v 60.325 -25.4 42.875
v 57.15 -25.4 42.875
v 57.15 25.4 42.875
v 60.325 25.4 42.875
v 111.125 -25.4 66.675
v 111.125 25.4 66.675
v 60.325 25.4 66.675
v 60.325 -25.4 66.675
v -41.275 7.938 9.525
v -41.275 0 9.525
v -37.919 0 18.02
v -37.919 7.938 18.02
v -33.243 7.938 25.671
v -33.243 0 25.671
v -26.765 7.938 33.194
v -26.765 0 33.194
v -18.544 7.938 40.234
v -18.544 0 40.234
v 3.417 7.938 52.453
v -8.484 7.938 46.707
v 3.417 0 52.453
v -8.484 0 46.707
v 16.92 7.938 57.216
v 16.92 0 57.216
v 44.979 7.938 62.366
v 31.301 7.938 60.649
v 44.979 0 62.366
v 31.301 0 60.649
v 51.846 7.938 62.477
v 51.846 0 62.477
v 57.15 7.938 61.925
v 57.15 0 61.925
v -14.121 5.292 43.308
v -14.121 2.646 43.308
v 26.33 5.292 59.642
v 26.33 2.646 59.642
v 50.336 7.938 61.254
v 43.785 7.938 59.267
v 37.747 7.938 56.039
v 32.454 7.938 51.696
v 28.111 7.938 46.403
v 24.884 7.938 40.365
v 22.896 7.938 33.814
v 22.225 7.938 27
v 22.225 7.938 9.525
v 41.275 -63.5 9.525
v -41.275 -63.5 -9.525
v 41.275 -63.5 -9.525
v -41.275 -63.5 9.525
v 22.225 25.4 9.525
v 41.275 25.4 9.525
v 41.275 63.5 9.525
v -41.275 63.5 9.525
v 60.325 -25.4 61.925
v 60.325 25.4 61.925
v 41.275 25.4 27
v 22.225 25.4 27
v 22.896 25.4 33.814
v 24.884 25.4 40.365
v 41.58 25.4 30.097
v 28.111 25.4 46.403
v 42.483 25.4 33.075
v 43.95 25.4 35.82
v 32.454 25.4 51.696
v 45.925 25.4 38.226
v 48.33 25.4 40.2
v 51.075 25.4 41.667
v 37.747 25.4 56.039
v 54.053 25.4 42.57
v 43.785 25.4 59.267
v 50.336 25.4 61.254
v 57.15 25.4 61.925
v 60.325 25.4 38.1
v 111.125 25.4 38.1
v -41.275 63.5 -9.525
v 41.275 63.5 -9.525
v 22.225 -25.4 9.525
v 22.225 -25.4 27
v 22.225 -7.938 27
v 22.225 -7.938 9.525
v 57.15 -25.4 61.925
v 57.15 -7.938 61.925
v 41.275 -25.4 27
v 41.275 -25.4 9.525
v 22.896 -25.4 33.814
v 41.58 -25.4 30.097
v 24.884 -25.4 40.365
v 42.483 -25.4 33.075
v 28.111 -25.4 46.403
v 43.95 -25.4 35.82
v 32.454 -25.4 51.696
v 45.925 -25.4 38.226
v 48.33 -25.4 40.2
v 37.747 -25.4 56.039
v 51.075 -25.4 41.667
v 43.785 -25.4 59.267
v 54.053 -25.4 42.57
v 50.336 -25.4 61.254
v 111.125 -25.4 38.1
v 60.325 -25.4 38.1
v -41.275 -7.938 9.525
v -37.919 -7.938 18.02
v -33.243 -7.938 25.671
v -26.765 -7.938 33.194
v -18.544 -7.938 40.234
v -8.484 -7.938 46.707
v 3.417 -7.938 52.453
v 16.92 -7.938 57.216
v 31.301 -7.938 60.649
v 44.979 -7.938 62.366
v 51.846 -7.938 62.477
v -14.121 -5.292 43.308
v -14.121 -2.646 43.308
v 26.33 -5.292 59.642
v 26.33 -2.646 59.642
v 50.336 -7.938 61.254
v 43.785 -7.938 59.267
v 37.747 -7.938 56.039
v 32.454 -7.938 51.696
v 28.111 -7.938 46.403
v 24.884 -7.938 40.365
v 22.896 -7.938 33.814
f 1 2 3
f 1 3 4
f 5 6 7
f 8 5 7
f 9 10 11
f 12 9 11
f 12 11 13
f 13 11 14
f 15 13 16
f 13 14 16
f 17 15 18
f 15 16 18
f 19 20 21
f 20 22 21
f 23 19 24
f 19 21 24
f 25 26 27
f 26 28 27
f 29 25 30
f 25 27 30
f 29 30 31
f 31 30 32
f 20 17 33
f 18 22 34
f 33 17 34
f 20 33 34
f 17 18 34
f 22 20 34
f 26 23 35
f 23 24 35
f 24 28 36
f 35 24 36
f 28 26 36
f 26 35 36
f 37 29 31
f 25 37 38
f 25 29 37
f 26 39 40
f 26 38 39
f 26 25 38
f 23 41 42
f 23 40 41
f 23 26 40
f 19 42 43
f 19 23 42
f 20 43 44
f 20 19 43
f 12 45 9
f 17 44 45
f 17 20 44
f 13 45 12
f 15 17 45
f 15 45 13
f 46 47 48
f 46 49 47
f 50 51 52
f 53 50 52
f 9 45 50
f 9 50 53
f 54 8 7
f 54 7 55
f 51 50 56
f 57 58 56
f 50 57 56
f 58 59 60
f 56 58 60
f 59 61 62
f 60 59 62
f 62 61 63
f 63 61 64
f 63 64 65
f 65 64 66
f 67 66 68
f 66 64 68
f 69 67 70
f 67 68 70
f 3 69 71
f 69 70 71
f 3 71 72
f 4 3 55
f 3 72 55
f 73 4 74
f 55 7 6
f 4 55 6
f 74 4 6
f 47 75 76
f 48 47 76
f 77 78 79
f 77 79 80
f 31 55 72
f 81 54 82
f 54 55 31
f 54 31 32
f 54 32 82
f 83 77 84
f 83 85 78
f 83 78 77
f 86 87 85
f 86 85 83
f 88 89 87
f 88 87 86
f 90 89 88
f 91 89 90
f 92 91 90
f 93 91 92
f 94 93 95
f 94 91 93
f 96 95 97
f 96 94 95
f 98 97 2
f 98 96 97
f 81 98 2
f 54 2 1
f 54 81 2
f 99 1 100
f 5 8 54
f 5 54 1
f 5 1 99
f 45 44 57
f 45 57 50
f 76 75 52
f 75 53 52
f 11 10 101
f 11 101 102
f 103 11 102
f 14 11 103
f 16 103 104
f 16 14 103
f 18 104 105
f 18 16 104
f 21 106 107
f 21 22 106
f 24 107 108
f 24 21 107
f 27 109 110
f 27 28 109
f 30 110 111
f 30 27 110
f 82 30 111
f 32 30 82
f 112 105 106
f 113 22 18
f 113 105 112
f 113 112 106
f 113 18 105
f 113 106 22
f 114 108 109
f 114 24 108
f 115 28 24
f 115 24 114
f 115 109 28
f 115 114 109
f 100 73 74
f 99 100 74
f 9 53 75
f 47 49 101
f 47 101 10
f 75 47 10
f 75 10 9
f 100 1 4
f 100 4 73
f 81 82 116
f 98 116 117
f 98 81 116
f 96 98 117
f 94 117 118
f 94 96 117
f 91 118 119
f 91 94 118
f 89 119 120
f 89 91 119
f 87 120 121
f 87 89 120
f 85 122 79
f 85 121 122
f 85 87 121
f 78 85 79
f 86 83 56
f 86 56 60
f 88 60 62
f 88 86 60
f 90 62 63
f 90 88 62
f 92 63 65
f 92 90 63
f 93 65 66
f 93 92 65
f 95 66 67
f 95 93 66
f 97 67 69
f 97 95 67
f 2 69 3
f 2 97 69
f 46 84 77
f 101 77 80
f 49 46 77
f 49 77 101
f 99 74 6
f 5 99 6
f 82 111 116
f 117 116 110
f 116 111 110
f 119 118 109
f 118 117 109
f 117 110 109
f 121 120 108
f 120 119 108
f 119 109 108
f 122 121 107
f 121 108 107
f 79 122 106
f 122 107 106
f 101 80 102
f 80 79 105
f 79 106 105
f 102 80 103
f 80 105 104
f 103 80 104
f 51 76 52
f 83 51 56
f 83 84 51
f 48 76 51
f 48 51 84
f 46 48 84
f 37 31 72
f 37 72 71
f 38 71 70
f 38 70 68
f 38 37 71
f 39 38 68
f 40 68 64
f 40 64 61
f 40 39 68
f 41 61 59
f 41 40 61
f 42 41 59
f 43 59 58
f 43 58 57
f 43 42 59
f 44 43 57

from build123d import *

# Parameters (mm, degrees)
F1_DEPTH = 63.5
F2_DEPTH = 25.4
F3_DEPTH = 7.9375


with BuildPart() as f1:
    # F0 (on Front) → F1 (new body, symmetric)
    with BuildSketch(Plane.XZ):
        Polygon((-41.275, -9.525), (41.275, -9.525), (41.275, 9.525), (22.225, 9.525), (-41.275, 9.525), align=None)
    extrude(amount=F1_DEPTH, both=True)

    # F0 (on Front) → F2 (join, symmetric)
    with BuildSketch(Plane.XZ):
        with BuildLine():
            Line((22.225, 9.525), (41.275, 9.525))
            Line((41.275, 9.525), (41.275, 27.0002))
            ThreePointArc((41.275, 27.0002), (45.92468, 38.22552), (57.15, 42.8752))
            Line((57.15, 42.8752), (60.325, 42.8752))
            Line((60.325, 42.8752), (60.325, 61.9252))
            Line((60.325, 61.9252), (57.15, 61.9252))
            ThreePointArc((57.15, 61.9252), (32.454296, 51.695904), (22.225, 27.0002))
            Line((22.225, 27.0002), (22.225, 9.525))
        make_face()
        Polygon((91.891411, 61.9252), (60.325, 61.9252), (60.325, 42.8752), (74.520705, 42.8752), (91.891411, 42.8752), align=None)
        Polygon((60.325, 66.675), (60.325, 61.9252), (91.891411, 61.9252), (91.891411, 42.8752), (74.520705, 42.8752), (60.325, 42.8752), (60.325, 38.1), (111.125, 38.1), (111.125, 66.675), align=None)
    extrude(amount=F2_DEPTH, both=True)

    # F0 (on Front) → F3 (join, symmetric)
    with BuildSketch(Plane.XZ):
        with BuildLine():
            add(Edge.make_bspline(
                [(-41.275, 9.525), (-28.410731, 53.163726), (38.786519, 65.535851), (57.15, 61.9252)],
                knots=[0, 0, 0, 0, 111.504536, 111.504536, 111.504536, 111.504536], degree=3))
            Line((-41.275, 9.525), (22.225, 9.525))
            Line((22.225, 9.525), (22.225, 27.0002))
            ThreePointArc((22.225, 27.0002), (32.454296, 51.695904), (57.15, 61.9252))
        make_face()
    extrude(amount=F3_DEPTH, both=True)


solid = f1.part
